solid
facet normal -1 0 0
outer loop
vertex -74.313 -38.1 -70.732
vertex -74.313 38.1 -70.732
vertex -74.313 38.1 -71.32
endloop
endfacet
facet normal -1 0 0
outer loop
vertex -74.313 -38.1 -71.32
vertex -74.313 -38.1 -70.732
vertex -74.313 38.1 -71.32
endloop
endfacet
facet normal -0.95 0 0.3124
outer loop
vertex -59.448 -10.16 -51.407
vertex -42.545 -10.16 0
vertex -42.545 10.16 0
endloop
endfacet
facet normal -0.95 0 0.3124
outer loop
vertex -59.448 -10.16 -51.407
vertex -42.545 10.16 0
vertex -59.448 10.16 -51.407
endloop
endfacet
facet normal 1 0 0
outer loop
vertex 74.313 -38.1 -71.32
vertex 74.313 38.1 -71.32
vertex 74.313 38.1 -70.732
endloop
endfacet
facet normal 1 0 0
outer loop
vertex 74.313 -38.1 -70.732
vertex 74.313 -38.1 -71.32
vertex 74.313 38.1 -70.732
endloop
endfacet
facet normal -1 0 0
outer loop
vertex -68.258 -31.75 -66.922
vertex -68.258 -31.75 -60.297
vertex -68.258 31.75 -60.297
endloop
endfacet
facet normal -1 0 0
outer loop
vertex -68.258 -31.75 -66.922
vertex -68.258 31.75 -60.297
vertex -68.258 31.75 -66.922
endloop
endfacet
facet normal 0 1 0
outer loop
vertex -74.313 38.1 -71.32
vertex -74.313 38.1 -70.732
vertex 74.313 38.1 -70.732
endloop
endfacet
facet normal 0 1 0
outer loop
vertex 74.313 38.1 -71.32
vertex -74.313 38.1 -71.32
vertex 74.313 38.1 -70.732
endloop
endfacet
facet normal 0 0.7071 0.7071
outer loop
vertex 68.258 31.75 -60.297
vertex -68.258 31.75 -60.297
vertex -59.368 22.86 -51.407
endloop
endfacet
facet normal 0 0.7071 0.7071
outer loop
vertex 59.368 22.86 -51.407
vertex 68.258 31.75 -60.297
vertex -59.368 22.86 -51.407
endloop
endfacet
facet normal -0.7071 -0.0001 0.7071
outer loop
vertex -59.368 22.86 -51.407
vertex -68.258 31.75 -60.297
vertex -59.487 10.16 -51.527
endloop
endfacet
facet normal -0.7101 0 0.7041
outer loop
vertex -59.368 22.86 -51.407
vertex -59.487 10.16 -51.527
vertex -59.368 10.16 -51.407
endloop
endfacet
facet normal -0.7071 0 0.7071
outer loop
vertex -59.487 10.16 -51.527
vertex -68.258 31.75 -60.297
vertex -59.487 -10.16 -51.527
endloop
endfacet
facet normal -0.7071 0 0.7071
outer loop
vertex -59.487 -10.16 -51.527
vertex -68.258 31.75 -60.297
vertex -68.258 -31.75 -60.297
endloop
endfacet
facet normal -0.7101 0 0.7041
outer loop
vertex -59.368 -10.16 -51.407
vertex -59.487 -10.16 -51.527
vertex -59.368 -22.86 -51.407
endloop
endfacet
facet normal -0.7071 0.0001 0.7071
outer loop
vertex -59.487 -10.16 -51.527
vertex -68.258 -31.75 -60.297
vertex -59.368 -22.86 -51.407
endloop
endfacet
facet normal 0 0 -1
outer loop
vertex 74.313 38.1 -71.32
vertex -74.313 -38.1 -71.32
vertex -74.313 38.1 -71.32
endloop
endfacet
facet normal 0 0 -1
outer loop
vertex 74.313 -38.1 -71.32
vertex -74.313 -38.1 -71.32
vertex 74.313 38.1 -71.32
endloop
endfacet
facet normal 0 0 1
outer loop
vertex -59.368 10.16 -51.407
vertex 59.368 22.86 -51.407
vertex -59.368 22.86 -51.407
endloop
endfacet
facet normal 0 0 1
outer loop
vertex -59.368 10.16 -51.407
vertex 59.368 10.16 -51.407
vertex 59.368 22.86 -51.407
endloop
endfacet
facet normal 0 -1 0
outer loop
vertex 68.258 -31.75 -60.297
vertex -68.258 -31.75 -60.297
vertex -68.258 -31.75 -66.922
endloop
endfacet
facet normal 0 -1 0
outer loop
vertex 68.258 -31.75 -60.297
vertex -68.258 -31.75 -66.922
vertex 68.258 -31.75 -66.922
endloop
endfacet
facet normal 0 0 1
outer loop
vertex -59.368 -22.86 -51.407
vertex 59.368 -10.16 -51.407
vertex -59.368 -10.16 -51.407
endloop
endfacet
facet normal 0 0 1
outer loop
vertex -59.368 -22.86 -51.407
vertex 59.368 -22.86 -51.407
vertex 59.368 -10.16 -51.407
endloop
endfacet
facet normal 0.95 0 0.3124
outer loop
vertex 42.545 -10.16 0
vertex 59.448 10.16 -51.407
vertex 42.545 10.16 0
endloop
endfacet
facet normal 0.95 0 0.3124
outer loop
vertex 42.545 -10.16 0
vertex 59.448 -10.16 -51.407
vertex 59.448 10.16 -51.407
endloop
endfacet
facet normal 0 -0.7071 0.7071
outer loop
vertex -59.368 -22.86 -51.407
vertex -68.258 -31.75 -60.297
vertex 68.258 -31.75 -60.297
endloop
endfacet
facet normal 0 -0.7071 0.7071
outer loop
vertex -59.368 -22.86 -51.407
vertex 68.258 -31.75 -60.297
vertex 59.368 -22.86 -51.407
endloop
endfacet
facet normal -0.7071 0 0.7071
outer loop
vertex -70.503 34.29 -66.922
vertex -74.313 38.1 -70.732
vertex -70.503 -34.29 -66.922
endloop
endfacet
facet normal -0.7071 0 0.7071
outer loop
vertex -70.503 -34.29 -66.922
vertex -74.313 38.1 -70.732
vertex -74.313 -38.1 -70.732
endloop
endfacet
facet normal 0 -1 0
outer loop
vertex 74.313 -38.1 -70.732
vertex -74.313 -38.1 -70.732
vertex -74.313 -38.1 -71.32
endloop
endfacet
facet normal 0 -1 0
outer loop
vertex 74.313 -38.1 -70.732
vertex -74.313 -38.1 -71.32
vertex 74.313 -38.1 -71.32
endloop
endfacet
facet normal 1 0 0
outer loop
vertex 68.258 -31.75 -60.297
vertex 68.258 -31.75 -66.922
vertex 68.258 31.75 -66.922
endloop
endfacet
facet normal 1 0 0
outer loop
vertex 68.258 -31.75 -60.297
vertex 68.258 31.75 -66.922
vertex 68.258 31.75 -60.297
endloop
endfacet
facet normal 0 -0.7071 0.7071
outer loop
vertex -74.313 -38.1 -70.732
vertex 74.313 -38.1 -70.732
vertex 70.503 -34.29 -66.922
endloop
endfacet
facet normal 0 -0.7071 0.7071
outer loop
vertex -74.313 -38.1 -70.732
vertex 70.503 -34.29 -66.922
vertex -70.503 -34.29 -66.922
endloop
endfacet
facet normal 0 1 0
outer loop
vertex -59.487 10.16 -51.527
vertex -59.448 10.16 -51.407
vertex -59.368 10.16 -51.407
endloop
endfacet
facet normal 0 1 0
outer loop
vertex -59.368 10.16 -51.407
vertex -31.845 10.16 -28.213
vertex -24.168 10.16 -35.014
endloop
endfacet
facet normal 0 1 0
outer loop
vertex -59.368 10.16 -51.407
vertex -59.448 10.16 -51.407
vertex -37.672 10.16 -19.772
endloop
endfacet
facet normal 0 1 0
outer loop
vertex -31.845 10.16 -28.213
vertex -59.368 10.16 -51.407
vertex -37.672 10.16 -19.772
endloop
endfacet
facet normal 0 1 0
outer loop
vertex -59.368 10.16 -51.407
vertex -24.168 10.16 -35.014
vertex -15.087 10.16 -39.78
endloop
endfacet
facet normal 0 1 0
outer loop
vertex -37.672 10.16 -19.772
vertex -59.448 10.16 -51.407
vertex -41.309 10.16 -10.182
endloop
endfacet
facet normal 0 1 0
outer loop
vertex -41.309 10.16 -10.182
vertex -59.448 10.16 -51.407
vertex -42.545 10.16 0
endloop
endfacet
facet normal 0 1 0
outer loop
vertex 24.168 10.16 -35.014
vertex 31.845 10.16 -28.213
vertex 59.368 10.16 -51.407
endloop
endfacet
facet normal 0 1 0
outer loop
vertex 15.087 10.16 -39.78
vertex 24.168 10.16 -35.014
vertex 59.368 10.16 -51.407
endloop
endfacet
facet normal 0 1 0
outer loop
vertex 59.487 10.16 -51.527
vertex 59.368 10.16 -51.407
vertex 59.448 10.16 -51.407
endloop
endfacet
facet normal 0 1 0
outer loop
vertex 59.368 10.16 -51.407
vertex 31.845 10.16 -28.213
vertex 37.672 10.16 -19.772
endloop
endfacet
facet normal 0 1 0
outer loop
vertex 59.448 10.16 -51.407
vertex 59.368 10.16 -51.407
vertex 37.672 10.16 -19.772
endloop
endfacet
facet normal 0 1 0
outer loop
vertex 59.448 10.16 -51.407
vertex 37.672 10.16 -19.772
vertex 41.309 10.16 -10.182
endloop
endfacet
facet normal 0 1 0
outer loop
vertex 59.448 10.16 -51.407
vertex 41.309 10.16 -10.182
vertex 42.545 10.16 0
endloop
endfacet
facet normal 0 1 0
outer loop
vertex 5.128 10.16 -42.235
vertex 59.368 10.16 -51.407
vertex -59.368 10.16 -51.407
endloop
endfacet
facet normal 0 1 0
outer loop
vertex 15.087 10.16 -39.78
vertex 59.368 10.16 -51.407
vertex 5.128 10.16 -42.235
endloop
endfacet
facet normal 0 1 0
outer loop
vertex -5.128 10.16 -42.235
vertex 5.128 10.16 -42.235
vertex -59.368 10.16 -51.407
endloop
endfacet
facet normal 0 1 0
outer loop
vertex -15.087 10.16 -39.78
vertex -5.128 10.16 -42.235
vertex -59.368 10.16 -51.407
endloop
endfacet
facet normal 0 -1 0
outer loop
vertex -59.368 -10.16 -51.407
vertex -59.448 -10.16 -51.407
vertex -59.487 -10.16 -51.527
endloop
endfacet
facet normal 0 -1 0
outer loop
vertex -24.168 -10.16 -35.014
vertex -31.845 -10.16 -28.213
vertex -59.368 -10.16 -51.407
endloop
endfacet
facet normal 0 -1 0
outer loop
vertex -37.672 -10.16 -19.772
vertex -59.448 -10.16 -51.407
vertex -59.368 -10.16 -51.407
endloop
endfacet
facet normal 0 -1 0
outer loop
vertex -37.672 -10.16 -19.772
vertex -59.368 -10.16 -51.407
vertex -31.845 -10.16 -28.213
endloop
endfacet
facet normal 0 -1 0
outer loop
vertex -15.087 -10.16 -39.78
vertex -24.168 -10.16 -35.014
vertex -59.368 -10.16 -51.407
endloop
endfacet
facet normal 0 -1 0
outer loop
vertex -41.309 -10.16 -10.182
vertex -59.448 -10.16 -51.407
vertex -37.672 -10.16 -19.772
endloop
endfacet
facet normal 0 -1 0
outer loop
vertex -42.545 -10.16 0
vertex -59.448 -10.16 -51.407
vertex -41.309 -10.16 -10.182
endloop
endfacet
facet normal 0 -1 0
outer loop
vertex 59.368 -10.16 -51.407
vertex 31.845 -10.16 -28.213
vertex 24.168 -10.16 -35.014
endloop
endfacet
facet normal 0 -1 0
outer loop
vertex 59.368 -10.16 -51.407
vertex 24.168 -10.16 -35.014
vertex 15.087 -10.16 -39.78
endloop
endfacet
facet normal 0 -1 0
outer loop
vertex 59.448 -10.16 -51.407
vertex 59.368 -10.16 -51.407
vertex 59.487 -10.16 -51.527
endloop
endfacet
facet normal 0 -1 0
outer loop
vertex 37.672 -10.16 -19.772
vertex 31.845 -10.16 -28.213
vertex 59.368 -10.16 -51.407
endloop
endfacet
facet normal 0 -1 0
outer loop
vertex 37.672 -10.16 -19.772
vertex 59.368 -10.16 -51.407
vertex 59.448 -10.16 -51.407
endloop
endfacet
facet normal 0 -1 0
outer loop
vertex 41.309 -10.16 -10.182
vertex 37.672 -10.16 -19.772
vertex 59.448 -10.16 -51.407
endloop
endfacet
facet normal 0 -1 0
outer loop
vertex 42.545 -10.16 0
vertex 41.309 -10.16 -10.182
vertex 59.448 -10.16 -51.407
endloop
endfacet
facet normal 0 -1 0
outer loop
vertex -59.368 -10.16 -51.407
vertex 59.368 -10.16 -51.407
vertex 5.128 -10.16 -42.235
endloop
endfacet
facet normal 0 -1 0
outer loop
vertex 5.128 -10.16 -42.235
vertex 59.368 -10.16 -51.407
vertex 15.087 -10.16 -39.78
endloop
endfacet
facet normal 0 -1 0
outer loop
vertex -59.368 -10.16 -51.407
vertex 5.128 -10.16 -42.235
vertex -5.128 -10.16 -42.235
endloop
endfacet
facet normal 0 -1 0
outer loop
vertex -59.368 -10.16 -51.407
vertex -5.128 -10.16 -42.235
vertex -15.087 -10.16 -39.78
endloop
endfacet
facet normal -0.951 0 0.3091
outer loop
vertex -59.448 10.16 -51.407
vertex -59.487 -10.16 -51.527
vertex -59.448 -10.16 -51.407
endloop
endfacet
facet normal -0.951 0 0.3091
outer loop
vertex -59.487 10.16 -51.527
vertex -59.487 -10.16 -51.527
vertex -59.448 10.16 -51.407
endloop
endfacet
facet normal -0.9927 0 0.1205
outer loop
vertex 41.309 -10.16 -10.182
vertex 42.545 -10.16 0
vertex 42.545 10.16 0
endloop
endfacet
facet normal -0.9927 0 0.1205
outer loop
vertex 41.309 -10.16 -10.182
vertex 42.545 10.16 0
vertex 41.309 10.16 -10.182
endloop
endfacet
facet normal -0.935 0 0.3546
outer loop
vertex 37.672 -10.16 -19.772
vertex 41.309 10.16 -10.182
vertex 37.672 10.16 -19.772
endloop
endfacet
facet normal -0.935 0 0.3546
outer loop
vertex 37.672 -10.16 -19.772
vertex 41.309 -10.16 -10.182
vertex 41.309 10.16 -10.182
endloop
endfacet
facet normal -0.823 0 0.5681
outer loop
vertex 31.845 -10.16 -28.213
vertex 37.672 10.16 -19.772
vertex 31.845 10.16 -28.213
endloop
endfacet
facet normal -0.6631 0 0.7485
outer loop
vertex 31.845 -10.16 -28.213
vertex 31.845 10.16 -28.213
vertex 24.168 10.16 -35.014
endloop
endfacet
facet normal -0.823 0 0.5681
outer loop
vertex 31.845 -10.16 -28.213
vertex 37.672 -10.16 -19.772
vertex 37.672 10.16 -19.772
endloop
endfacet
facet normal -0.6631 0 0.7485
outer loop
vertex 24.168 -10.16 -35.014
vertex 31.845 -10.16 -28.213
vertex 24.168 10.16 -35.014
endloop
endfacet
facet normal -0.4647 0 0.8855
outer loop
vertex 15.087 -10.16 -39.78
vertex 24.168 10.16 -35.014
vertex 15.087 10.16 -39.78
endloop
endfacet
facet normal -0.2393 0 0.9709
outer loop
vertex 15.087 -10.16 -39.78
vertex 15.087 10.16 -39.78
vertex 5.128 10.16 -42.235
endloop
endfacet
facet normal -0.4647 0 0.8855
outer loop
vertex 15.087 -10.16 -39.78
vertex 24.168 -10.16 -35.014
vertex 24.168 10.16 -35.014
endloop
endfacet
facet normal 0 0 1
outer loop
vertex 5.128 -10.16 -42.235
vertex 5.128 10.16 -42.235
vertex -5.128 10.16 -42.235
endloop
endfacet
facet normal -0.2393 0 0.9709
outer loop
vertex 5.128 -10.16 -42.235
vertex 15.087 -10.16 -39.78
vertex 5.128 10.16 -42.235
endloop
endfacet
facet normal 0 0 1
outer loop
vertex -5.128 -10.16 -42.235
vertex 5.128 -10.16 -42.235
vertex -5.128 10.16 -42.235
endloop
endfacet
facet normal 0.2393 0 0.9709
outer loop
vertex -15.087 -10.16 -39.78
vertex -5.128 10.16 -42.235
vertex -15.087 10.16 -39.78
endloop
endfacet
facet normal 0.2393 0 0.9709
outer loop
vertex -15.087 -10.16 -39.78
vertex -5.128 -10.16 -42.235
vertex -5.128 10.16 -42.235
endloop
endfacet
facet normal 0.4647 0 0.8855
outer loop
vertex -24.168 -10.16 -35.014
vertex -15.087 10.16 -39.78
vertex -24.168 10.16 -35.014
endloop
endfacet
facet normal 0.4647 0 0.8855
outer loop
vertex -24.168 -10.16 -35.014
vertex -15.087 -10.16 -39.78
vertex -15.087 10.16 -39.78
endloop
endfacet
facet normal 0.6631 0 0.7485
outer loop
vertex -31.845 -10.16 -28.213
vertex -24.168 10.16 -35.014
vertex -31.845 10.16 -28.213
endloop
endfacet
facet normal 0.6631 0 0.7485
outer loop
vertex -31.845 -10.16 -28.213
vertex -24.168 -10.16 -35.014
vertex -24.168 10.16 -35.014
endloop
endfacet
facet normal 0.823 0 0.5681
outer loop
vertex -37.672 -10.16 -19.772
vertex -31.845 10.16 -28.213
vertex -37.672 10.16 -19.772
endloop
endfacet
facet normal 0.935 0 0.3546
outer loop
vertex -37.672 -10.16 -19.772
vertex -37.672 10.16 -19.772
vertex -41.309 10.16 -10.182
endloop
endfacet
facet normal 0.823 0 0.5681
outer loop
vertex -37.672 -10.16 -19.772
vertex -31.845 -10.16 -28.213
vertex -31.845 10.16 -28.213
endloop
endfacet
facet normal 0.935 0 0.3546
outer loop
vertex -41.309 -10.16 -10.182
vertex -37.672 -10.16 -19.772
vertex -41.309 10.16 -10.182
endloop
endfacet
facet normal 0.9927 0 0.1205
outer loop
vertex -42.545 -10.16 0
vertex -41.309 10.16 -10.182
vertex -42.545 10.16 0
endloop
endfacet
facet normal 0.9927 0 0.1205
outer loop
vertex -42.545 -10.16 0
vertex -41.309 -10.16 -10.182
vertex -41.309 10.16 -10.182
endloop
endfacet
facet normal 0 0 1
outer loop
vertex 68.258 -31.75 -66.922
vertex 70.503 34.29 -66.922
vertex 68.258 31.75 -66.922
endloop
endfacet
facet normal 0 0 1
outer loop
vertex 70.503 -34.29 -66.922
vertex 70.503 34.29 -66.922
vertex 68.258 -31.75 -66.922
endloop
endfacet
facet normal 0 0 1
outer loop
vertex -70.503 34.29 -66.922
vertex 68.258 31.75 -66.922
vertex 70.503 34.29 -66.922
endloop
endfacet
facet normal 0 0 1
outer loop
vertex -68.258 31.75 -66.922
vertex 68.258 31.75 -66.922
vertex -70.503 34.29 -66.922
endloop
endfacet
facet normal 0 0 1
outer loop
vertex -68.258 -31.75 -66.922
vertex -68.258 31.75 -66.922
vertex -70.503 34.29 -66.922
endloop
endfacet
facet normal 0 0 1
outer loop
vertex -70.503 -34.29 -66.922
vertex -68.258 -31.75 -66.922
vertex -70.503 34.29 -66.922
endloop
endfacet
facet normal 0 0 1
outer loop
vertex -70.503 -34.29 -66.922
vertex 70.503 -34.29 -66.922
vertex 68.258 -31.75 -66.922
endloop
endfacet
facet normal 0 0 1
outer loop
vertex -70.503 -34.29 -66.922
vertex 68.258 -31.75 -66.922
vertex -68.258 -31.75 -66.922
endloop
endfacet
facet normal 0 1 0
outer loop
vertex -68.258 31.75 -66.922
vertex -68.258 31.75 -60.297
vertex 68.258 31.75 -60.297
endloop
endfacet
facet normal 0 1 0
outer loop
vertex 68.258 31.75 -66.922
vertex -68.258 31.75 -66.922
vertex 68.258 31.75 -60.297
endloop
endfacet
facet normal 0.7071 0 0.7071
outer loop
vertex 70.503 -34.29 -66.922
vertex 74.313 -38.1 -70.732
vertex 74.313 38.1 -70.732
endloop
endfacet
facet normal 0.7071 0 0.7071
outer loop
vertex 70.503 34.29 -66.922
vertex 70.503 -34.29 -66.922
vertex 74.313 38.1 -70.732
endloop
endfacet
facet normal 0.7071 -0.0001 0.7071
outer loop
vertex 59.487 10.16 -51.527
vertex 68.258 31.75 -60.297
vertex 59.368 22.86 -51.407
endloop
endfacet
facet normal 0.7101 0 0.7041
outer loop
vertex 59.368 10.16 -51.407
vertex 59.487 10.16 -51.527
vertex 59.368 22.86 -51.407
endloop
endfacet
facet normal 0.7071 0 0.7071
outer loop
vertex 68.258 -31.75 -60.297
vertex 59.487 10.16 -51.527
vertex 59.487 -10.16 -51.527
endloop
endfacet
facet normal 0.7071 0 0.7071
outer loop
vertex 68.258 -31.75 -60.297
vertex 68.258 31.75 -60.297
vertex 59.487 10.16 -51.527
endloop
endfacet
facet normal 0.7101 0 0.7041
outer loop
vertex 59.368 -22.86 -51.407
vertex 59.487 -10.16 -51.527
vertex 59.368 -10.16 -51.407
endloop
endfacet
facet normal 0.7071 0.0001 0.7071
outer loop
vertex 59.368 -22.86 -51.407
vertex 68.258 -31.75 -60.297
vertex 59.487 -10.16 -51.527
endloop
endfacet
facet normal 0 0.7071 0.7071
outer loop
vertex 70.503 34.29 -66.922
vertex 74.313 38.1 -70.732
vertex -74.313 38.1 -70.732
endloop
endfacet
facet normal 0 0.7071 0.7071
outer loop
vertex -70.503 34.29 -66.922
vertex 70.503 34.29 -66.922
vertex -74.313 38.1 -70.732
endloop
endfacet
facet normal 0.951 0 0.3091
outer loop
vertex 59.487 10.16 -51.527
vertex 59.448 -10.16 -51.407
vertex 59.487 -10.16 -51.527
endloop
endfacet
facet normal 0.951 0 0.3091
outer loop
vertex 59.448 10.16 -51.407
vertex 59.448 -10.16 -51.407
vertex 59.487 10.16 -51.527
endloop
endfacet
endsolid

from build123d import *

# Parameters (mm, degrees)
F1_DEPTH     = 10.16
F2_DEPTH     = 31.75
F3_DEPTH     = 38.1
F4_T1_DEPTH  = 182.2402005013
F4_T6_DEPTH  = 109.224523526
F4_T12_DEPTH = 109.224523526
F4_T18_DEPTH = 109.224523526
F4_T25_DEPTH = 109.224523526
F4_T31_DEPTH = 109.224523526
F4_T37_DEPTH = 109.224523526
F4_T43_DEPTH = 109.224523526
F4_T49_DEPTH = 109.224523526
F4_T56_DEPTH = 109.224523526
F4_T62_DEPTH = 109.224523526
F5_SIZE      = 3.81


# Not quite as in the source:
# - a fillet or chamfer that OpenCascade refuses, or shapes differently, is made with other operations: its cross-section is extruded or revolved along the edge and cut away or added


with BuildPart() as f1:
    # F0 (on Front) → F1 (new body, symmetric)
    with BuildSketch(Plane.XZ):
        with BuildLine():
            Line((59.4478547573, -51.4072924852), (42.545, 0))
            ThreePointArc((42.545, 0), (0, -42.545), (-42.545, 0))
            Line((-42.545, 0), (-59.4478547573, -51.4072924852))
            Line((-59.4478547573, -51.4072924852), (0, -51.4072924852))
            Line((0, -51.4072924852), (59.4478547573, -51.4072924852))
        make_face()
    extrude(amount=F1_DEPTH, both=True)

    # F0 (on Front) → F2 (join, symmetric)
    with BuildSketch(Plane.XZ):
        Polygon((0, -51.4072924852), (-59.4478547573, -51.4072924852), (-68.2578384876, -51.4072924852), (-68.2578384876, -66.9220536947), (0, -66.9220536947), align=None)
        Polygon((68.2578384876, -51.4072924852), (59.4478547573, -51.4072924852), (0, -51.4072924852), (0, -66.9220536947), (68.2578384876, -66.9220536947), align=None)
    extrude(amount=F2_DEPTH, both=True)

    # F0 (on Front) → F3 (join, symmetric)
    with BuildSketch(Plane.XZ):
        Polygon((74.3125453591, -66.9220536947), (68.2578384876, -66.9220536947), (0, -66.9220536947), (0, -71.3198781013), (74.3125453591, -71.3198781013), align=None)
        Polygon((0, -71.3198781013), (0, -66.9220536947), (-68.2578384876, -66.9220536947), (-74.3125453591, -66.9220536947), (-74.3125453591, -71.3198781013), align=None)
    extrude(amount=F3_DEPTH, both=True)

    # F4: chamfer of 8.89 on 4 edges, made by hand

    # F4_s2 → F4_t1 (cut)
    with BuildSketch(Plane.YZ.offset(-91.1201002506)):
        Polygon((-31.75, -60.2972924852), (-22.86, -51.4072924852), (-31.75, -51.4072924852), align=None)
        Polygon((31.75, -60.2972924852), (22.86, -51.4072924852), (31.75, -51.4072924852), align=None)
    extrude(amount=F4_T1_DEPTH, mode=Mode.SUBTRACT)


with BuildPart() as f4_tool4:
    # F4_s5 → F4_t6 (new body)
    with BuildSketch(Plane.XZ.offset(54.612261763)):
        Polygon((68.2578384876, -60.2972924852), (59.3678384876, -51.4072924852), (68.2578384876, -51.4072924852), align=None)
    extrude(amount=-F4_T6_DEPTH)

    split(bisect_by=Plane(origin=(38.3941614285, 0, 12.624102589), x_dir=(0, 1, 0), z_dir=(0.949966585, 0, 0.3123515446)), keep=Keep.TOP)

    split(bisect_by=Plane.XZ.offset(10.16), keep=Keep.TOP)


with BuildPart() as f1_1:
    add(f1.part)

    # F4_t3: cut F4_tool4
    add(f4_tool4.part, mode=Mode.SUBTRACT)


with BuildPart() as f4_tool10:
    # F4_s11 → F4_t12 (new body)
    with BuildSketch(Plane.XZ.offset(54.612261763)):
        Polygon((68.2578384876, -60.2972924852), (59.3678384876, -51.4072924852), (68.2578384876, -51.4072924852), align=None)
    extrude(amount=-F4_T12_DEPTH)

    split(bisect_by=Plane(origin=(38.3941614285, 0, 12.624102589), x_dir=(0, 1, 0), z_dir=(-0.949966585, 0, -0.3123515446)), keep=Keep.TOP)

    split(bisect_by=Plane.XZ.offset(10.16), keep=Keep.TOP)


with BuildPart() as f1_2:
    add(f1_1.part)

    # F4_t9: cut F4_tool10
    add(f4_tool10.part, mode=Mode.SUBTRACT)


with BuildPart() as f4_tool16:
    # F4_s17 → F4_t18 (new body)
    with BuildSketch(Plane.XZ.offset(54.612261763)):
        Polygon((68.2578384876, -60.2972924852), (59.3678384876, -51.4072924852), (68.2578384876, -51.4072924852), align=None)
    extrude(amount=-F4_T18_DEPTH)

    split(bisect_by=Plane(origin=(38.3941614285, 0, 12.624102589), x_dir=(0, 1, 0), z_dir=(0.949966585, 0, 0.3123515446)), keep=Keep.TOP)

    split(bisect_by=Plane.XZ.offset(-10.16), keep=Keep.TOP)

    split(bisect_by=Plane.XZ.offset(10.16), keep=Keep.BOTTOM)


with BuildPart() as f1_3:
    add(f1_2.part)

    # F4_t15: cut F4_tool16
    add(f4_tool16.part, mode=Mode.SUBTRACT)


with BuildPart() as f4_tool23:
    # F4_s24 → F4_t25 (new body)
    with BuildSketch(Plane.XZ.offset(54.612261763)):
        Polygon((68.2578384876, -60.2972924852), (59.3678384876, -51.4072924852), (68.2578384876, -51.4072924852), align=None)
    extrude(amount=-F4_T25_DEPTH)

    split(bisect_by=Plane(origin=(38.3941614285, 0, 12.624102589), x_dir=(0, 1, 0), z_dir=(0.949966585, 0, 0.3123515446)), keep=Keep.TOP)

    split(bisect_by=Plane.XZ.offset(-10.16), keep=Keep.BOTTOM)


with BuildPart() as f1_4:
    add(f1_3.part)

    # F4_t22: cut F4_tool23
    add(f4_tool23.part, mode=Mode.SUBTRACT)


with BuildPart() as f4_tool29:
    # F4_s30 → F4_t31 (new body)
    with BuildSketch(Plane.XZ.offset(54.612261763)):
        Polygon((68.2578384876, -60.2972924852), (59.3678384876, -51.4072924852), (68.2578384876, -51.4072924852), align=None)
    extrude(amount=-F4_T31_DEPTH)

    split(bisect_by=Plane(origin=(38.3941614285, 0, 12.624102589), x_dir=(0, 1, 0), z_dir=(-0.949966585, 0, -0.3123515446)), keep=Keep.TOP)

    split(bisect_by=Plane.XZ.offset(-10.16), keep=Keep.BOTTOM)


with BuildPart() as f1_5:
    add(f1_4.part)

    # F4_t28: cut F4_tool29
    add(f4_tool29.part, mode=Mode.SUBTRACT)


with BuildPart() as f4_tool35:
    # F4_s36 → F4_t37 (new body)
    with BuildSketch(Plane.XZ.offset(54.612261763)):
        Polygon((-68.2578384876, -60.2972924852), (-59.3678384876, -51.4072924852), (-68.2578384876, -51.4072924852), align=None)
    extrude(amount=-F4_T37_DEPTH)

    split(bisect_by=Plane(origin=(-38.3941614285, 0, 12.624102589), x_dir=(0, 1, 0), z_dir=(-0.949966585, 0, 0.3123515446)), keep=Keep.TOP)

    split(bisect_by=Plane.XZ.offset(10.16), keep=Keep.TOP)


with BuildPart() as f1_6:
    add(f1_5.part)

    # F4_t34: cut F4_tool35
    add(f4_tool35.part, mode=Mode.SUBTRACT)


with BuildPart() as f4_tool41:
    # F4_s42 → F4_t43 (new body)
    with BuildSketch(Plane.XZ.offset(54.612261763)):
        Polygon((-68.2578384876, -60.2972924852), (-59.3678384876, -51.4072924852), (-68.2578384876, -51.4072924852), align=None)
    extrude(amount=-F4_T43_DEPTH)

    split(bisect_by=Plane(origin=(-38.3941614285, 0, 12.624102589), x_dir=(0, 1, 0), z_dir=(0.949966585, 0, -0.3123515446)), keep=Keep.TOP)

    split(bisect_by=Plane.XZ.offset(10.16), keep=Keep.TOP)


with BuildPart() as f1_7:
    add(f1_6.part)

    # F4_t40: cut F4_tool41
    add(f4_tool41.part, mode=Mode.SUBTRACT)


with BuildPart() as f4_tool47:
    # F4_s48 → F4_t49 (new body)
    with BuildSketch(Plane.XZ.offset(54.612261763)):
        Polygon((-68.2578384876, -60.2972924852), (-59.3678384876, -51.4072924852), (-68.2578384876, -51.4072924852), align=None)
    extrude(amount=-F4_T49_DEPTH)

    split(bisect_by=Plane.XZ.offset(-10.16), keep=Keep.TOP)

    split(bisect_by=Plane(origin=(-38.3941614285, 0, 12.624102589), x_dir=(0, 1, 0), z_dir=(-0.949966585, 0, 0.3123515446)), keep=Keep.TOP)

    split(bisect_by=Plane.XZ.offset(10.16), keep=Keep.BOTTOM)


with BuildPart() as f1_8:
    add(f1_7.part)

    # F4_t46: cut F4_tool47
    add(f4_tool47.part, mode=Mode.SUBTRACT)


with BuildPart() as f4_tool54:
    # F4_s55 → F4_t56 (new body)
    with BuildSketch(Plane.XZ.offset(54.612261763)):
        Polygon((-68.2578384876, -60.2972924852), (-59.3678384876, -51.4072924852), (-68.2578384876, -51.4072924852), align=None)
    extrude(amount=-F4_T56_DEPTH)

    split(bisect_by=Plane.XZ.offset(-10.16), keep=Keep.BOTTOM)

    split(bisect_by=Plane(origin=(-38.3941614285, 0, 12.624102589), x_dir=(0, 1, 0), z_dir=(-0.949966585, 0, 0.3123515446)), keep=Keep.TOP)


with BuildPart() as f1_9:
    add(f1_8.part)

    # F4_t53: cut F4_tool54
    add(f4_tool54.part, mode=Mode.SUBTRACT)


with BuildPart() as f4_tool60:
    # F4_s61 → F4_t62 (new body)
    with BuildSketch(Plane.XZ.offset(54.612261763)):
        Polygon((-68.2578384876, -60.2972924852), (-59.3678384876, -51.4072924852), (-68.2578384876, -51.4072924852), align=None)
    extrude(amount=-F4_T62_DEPTH)

    split(bisect_by=Plane.XZ.offset(-10.16), keep=Keep.BOTTOM)

    split(bisect_by=Plane(origin=(-38.3941614285, 0, 12.624102589), x_dir=(0, 1, 0), z_dir=(0.949966585, 0, -0.3123515446)), keep=Keep.TOP)


with BuildPart() as f1_10:
    add(f1_9.part)

    # F4_t59: cut F4_tool60
    add(f4_tool60.part, mode=Mode.SUBTRACT)

    # F5
    f5_edges = [f1_10.edges().sort_by_distance(p)[0] for p in [
        (0, -38.1, -66.922054),
        (-74.312545, 0, -66.922054),
        (74.312545, 0, -66.922054),
        (0, 38.1, -66.922054),
    ]]
    chamfer(f5_edges, length=F5_SIZE)


solid = f1_10.part
